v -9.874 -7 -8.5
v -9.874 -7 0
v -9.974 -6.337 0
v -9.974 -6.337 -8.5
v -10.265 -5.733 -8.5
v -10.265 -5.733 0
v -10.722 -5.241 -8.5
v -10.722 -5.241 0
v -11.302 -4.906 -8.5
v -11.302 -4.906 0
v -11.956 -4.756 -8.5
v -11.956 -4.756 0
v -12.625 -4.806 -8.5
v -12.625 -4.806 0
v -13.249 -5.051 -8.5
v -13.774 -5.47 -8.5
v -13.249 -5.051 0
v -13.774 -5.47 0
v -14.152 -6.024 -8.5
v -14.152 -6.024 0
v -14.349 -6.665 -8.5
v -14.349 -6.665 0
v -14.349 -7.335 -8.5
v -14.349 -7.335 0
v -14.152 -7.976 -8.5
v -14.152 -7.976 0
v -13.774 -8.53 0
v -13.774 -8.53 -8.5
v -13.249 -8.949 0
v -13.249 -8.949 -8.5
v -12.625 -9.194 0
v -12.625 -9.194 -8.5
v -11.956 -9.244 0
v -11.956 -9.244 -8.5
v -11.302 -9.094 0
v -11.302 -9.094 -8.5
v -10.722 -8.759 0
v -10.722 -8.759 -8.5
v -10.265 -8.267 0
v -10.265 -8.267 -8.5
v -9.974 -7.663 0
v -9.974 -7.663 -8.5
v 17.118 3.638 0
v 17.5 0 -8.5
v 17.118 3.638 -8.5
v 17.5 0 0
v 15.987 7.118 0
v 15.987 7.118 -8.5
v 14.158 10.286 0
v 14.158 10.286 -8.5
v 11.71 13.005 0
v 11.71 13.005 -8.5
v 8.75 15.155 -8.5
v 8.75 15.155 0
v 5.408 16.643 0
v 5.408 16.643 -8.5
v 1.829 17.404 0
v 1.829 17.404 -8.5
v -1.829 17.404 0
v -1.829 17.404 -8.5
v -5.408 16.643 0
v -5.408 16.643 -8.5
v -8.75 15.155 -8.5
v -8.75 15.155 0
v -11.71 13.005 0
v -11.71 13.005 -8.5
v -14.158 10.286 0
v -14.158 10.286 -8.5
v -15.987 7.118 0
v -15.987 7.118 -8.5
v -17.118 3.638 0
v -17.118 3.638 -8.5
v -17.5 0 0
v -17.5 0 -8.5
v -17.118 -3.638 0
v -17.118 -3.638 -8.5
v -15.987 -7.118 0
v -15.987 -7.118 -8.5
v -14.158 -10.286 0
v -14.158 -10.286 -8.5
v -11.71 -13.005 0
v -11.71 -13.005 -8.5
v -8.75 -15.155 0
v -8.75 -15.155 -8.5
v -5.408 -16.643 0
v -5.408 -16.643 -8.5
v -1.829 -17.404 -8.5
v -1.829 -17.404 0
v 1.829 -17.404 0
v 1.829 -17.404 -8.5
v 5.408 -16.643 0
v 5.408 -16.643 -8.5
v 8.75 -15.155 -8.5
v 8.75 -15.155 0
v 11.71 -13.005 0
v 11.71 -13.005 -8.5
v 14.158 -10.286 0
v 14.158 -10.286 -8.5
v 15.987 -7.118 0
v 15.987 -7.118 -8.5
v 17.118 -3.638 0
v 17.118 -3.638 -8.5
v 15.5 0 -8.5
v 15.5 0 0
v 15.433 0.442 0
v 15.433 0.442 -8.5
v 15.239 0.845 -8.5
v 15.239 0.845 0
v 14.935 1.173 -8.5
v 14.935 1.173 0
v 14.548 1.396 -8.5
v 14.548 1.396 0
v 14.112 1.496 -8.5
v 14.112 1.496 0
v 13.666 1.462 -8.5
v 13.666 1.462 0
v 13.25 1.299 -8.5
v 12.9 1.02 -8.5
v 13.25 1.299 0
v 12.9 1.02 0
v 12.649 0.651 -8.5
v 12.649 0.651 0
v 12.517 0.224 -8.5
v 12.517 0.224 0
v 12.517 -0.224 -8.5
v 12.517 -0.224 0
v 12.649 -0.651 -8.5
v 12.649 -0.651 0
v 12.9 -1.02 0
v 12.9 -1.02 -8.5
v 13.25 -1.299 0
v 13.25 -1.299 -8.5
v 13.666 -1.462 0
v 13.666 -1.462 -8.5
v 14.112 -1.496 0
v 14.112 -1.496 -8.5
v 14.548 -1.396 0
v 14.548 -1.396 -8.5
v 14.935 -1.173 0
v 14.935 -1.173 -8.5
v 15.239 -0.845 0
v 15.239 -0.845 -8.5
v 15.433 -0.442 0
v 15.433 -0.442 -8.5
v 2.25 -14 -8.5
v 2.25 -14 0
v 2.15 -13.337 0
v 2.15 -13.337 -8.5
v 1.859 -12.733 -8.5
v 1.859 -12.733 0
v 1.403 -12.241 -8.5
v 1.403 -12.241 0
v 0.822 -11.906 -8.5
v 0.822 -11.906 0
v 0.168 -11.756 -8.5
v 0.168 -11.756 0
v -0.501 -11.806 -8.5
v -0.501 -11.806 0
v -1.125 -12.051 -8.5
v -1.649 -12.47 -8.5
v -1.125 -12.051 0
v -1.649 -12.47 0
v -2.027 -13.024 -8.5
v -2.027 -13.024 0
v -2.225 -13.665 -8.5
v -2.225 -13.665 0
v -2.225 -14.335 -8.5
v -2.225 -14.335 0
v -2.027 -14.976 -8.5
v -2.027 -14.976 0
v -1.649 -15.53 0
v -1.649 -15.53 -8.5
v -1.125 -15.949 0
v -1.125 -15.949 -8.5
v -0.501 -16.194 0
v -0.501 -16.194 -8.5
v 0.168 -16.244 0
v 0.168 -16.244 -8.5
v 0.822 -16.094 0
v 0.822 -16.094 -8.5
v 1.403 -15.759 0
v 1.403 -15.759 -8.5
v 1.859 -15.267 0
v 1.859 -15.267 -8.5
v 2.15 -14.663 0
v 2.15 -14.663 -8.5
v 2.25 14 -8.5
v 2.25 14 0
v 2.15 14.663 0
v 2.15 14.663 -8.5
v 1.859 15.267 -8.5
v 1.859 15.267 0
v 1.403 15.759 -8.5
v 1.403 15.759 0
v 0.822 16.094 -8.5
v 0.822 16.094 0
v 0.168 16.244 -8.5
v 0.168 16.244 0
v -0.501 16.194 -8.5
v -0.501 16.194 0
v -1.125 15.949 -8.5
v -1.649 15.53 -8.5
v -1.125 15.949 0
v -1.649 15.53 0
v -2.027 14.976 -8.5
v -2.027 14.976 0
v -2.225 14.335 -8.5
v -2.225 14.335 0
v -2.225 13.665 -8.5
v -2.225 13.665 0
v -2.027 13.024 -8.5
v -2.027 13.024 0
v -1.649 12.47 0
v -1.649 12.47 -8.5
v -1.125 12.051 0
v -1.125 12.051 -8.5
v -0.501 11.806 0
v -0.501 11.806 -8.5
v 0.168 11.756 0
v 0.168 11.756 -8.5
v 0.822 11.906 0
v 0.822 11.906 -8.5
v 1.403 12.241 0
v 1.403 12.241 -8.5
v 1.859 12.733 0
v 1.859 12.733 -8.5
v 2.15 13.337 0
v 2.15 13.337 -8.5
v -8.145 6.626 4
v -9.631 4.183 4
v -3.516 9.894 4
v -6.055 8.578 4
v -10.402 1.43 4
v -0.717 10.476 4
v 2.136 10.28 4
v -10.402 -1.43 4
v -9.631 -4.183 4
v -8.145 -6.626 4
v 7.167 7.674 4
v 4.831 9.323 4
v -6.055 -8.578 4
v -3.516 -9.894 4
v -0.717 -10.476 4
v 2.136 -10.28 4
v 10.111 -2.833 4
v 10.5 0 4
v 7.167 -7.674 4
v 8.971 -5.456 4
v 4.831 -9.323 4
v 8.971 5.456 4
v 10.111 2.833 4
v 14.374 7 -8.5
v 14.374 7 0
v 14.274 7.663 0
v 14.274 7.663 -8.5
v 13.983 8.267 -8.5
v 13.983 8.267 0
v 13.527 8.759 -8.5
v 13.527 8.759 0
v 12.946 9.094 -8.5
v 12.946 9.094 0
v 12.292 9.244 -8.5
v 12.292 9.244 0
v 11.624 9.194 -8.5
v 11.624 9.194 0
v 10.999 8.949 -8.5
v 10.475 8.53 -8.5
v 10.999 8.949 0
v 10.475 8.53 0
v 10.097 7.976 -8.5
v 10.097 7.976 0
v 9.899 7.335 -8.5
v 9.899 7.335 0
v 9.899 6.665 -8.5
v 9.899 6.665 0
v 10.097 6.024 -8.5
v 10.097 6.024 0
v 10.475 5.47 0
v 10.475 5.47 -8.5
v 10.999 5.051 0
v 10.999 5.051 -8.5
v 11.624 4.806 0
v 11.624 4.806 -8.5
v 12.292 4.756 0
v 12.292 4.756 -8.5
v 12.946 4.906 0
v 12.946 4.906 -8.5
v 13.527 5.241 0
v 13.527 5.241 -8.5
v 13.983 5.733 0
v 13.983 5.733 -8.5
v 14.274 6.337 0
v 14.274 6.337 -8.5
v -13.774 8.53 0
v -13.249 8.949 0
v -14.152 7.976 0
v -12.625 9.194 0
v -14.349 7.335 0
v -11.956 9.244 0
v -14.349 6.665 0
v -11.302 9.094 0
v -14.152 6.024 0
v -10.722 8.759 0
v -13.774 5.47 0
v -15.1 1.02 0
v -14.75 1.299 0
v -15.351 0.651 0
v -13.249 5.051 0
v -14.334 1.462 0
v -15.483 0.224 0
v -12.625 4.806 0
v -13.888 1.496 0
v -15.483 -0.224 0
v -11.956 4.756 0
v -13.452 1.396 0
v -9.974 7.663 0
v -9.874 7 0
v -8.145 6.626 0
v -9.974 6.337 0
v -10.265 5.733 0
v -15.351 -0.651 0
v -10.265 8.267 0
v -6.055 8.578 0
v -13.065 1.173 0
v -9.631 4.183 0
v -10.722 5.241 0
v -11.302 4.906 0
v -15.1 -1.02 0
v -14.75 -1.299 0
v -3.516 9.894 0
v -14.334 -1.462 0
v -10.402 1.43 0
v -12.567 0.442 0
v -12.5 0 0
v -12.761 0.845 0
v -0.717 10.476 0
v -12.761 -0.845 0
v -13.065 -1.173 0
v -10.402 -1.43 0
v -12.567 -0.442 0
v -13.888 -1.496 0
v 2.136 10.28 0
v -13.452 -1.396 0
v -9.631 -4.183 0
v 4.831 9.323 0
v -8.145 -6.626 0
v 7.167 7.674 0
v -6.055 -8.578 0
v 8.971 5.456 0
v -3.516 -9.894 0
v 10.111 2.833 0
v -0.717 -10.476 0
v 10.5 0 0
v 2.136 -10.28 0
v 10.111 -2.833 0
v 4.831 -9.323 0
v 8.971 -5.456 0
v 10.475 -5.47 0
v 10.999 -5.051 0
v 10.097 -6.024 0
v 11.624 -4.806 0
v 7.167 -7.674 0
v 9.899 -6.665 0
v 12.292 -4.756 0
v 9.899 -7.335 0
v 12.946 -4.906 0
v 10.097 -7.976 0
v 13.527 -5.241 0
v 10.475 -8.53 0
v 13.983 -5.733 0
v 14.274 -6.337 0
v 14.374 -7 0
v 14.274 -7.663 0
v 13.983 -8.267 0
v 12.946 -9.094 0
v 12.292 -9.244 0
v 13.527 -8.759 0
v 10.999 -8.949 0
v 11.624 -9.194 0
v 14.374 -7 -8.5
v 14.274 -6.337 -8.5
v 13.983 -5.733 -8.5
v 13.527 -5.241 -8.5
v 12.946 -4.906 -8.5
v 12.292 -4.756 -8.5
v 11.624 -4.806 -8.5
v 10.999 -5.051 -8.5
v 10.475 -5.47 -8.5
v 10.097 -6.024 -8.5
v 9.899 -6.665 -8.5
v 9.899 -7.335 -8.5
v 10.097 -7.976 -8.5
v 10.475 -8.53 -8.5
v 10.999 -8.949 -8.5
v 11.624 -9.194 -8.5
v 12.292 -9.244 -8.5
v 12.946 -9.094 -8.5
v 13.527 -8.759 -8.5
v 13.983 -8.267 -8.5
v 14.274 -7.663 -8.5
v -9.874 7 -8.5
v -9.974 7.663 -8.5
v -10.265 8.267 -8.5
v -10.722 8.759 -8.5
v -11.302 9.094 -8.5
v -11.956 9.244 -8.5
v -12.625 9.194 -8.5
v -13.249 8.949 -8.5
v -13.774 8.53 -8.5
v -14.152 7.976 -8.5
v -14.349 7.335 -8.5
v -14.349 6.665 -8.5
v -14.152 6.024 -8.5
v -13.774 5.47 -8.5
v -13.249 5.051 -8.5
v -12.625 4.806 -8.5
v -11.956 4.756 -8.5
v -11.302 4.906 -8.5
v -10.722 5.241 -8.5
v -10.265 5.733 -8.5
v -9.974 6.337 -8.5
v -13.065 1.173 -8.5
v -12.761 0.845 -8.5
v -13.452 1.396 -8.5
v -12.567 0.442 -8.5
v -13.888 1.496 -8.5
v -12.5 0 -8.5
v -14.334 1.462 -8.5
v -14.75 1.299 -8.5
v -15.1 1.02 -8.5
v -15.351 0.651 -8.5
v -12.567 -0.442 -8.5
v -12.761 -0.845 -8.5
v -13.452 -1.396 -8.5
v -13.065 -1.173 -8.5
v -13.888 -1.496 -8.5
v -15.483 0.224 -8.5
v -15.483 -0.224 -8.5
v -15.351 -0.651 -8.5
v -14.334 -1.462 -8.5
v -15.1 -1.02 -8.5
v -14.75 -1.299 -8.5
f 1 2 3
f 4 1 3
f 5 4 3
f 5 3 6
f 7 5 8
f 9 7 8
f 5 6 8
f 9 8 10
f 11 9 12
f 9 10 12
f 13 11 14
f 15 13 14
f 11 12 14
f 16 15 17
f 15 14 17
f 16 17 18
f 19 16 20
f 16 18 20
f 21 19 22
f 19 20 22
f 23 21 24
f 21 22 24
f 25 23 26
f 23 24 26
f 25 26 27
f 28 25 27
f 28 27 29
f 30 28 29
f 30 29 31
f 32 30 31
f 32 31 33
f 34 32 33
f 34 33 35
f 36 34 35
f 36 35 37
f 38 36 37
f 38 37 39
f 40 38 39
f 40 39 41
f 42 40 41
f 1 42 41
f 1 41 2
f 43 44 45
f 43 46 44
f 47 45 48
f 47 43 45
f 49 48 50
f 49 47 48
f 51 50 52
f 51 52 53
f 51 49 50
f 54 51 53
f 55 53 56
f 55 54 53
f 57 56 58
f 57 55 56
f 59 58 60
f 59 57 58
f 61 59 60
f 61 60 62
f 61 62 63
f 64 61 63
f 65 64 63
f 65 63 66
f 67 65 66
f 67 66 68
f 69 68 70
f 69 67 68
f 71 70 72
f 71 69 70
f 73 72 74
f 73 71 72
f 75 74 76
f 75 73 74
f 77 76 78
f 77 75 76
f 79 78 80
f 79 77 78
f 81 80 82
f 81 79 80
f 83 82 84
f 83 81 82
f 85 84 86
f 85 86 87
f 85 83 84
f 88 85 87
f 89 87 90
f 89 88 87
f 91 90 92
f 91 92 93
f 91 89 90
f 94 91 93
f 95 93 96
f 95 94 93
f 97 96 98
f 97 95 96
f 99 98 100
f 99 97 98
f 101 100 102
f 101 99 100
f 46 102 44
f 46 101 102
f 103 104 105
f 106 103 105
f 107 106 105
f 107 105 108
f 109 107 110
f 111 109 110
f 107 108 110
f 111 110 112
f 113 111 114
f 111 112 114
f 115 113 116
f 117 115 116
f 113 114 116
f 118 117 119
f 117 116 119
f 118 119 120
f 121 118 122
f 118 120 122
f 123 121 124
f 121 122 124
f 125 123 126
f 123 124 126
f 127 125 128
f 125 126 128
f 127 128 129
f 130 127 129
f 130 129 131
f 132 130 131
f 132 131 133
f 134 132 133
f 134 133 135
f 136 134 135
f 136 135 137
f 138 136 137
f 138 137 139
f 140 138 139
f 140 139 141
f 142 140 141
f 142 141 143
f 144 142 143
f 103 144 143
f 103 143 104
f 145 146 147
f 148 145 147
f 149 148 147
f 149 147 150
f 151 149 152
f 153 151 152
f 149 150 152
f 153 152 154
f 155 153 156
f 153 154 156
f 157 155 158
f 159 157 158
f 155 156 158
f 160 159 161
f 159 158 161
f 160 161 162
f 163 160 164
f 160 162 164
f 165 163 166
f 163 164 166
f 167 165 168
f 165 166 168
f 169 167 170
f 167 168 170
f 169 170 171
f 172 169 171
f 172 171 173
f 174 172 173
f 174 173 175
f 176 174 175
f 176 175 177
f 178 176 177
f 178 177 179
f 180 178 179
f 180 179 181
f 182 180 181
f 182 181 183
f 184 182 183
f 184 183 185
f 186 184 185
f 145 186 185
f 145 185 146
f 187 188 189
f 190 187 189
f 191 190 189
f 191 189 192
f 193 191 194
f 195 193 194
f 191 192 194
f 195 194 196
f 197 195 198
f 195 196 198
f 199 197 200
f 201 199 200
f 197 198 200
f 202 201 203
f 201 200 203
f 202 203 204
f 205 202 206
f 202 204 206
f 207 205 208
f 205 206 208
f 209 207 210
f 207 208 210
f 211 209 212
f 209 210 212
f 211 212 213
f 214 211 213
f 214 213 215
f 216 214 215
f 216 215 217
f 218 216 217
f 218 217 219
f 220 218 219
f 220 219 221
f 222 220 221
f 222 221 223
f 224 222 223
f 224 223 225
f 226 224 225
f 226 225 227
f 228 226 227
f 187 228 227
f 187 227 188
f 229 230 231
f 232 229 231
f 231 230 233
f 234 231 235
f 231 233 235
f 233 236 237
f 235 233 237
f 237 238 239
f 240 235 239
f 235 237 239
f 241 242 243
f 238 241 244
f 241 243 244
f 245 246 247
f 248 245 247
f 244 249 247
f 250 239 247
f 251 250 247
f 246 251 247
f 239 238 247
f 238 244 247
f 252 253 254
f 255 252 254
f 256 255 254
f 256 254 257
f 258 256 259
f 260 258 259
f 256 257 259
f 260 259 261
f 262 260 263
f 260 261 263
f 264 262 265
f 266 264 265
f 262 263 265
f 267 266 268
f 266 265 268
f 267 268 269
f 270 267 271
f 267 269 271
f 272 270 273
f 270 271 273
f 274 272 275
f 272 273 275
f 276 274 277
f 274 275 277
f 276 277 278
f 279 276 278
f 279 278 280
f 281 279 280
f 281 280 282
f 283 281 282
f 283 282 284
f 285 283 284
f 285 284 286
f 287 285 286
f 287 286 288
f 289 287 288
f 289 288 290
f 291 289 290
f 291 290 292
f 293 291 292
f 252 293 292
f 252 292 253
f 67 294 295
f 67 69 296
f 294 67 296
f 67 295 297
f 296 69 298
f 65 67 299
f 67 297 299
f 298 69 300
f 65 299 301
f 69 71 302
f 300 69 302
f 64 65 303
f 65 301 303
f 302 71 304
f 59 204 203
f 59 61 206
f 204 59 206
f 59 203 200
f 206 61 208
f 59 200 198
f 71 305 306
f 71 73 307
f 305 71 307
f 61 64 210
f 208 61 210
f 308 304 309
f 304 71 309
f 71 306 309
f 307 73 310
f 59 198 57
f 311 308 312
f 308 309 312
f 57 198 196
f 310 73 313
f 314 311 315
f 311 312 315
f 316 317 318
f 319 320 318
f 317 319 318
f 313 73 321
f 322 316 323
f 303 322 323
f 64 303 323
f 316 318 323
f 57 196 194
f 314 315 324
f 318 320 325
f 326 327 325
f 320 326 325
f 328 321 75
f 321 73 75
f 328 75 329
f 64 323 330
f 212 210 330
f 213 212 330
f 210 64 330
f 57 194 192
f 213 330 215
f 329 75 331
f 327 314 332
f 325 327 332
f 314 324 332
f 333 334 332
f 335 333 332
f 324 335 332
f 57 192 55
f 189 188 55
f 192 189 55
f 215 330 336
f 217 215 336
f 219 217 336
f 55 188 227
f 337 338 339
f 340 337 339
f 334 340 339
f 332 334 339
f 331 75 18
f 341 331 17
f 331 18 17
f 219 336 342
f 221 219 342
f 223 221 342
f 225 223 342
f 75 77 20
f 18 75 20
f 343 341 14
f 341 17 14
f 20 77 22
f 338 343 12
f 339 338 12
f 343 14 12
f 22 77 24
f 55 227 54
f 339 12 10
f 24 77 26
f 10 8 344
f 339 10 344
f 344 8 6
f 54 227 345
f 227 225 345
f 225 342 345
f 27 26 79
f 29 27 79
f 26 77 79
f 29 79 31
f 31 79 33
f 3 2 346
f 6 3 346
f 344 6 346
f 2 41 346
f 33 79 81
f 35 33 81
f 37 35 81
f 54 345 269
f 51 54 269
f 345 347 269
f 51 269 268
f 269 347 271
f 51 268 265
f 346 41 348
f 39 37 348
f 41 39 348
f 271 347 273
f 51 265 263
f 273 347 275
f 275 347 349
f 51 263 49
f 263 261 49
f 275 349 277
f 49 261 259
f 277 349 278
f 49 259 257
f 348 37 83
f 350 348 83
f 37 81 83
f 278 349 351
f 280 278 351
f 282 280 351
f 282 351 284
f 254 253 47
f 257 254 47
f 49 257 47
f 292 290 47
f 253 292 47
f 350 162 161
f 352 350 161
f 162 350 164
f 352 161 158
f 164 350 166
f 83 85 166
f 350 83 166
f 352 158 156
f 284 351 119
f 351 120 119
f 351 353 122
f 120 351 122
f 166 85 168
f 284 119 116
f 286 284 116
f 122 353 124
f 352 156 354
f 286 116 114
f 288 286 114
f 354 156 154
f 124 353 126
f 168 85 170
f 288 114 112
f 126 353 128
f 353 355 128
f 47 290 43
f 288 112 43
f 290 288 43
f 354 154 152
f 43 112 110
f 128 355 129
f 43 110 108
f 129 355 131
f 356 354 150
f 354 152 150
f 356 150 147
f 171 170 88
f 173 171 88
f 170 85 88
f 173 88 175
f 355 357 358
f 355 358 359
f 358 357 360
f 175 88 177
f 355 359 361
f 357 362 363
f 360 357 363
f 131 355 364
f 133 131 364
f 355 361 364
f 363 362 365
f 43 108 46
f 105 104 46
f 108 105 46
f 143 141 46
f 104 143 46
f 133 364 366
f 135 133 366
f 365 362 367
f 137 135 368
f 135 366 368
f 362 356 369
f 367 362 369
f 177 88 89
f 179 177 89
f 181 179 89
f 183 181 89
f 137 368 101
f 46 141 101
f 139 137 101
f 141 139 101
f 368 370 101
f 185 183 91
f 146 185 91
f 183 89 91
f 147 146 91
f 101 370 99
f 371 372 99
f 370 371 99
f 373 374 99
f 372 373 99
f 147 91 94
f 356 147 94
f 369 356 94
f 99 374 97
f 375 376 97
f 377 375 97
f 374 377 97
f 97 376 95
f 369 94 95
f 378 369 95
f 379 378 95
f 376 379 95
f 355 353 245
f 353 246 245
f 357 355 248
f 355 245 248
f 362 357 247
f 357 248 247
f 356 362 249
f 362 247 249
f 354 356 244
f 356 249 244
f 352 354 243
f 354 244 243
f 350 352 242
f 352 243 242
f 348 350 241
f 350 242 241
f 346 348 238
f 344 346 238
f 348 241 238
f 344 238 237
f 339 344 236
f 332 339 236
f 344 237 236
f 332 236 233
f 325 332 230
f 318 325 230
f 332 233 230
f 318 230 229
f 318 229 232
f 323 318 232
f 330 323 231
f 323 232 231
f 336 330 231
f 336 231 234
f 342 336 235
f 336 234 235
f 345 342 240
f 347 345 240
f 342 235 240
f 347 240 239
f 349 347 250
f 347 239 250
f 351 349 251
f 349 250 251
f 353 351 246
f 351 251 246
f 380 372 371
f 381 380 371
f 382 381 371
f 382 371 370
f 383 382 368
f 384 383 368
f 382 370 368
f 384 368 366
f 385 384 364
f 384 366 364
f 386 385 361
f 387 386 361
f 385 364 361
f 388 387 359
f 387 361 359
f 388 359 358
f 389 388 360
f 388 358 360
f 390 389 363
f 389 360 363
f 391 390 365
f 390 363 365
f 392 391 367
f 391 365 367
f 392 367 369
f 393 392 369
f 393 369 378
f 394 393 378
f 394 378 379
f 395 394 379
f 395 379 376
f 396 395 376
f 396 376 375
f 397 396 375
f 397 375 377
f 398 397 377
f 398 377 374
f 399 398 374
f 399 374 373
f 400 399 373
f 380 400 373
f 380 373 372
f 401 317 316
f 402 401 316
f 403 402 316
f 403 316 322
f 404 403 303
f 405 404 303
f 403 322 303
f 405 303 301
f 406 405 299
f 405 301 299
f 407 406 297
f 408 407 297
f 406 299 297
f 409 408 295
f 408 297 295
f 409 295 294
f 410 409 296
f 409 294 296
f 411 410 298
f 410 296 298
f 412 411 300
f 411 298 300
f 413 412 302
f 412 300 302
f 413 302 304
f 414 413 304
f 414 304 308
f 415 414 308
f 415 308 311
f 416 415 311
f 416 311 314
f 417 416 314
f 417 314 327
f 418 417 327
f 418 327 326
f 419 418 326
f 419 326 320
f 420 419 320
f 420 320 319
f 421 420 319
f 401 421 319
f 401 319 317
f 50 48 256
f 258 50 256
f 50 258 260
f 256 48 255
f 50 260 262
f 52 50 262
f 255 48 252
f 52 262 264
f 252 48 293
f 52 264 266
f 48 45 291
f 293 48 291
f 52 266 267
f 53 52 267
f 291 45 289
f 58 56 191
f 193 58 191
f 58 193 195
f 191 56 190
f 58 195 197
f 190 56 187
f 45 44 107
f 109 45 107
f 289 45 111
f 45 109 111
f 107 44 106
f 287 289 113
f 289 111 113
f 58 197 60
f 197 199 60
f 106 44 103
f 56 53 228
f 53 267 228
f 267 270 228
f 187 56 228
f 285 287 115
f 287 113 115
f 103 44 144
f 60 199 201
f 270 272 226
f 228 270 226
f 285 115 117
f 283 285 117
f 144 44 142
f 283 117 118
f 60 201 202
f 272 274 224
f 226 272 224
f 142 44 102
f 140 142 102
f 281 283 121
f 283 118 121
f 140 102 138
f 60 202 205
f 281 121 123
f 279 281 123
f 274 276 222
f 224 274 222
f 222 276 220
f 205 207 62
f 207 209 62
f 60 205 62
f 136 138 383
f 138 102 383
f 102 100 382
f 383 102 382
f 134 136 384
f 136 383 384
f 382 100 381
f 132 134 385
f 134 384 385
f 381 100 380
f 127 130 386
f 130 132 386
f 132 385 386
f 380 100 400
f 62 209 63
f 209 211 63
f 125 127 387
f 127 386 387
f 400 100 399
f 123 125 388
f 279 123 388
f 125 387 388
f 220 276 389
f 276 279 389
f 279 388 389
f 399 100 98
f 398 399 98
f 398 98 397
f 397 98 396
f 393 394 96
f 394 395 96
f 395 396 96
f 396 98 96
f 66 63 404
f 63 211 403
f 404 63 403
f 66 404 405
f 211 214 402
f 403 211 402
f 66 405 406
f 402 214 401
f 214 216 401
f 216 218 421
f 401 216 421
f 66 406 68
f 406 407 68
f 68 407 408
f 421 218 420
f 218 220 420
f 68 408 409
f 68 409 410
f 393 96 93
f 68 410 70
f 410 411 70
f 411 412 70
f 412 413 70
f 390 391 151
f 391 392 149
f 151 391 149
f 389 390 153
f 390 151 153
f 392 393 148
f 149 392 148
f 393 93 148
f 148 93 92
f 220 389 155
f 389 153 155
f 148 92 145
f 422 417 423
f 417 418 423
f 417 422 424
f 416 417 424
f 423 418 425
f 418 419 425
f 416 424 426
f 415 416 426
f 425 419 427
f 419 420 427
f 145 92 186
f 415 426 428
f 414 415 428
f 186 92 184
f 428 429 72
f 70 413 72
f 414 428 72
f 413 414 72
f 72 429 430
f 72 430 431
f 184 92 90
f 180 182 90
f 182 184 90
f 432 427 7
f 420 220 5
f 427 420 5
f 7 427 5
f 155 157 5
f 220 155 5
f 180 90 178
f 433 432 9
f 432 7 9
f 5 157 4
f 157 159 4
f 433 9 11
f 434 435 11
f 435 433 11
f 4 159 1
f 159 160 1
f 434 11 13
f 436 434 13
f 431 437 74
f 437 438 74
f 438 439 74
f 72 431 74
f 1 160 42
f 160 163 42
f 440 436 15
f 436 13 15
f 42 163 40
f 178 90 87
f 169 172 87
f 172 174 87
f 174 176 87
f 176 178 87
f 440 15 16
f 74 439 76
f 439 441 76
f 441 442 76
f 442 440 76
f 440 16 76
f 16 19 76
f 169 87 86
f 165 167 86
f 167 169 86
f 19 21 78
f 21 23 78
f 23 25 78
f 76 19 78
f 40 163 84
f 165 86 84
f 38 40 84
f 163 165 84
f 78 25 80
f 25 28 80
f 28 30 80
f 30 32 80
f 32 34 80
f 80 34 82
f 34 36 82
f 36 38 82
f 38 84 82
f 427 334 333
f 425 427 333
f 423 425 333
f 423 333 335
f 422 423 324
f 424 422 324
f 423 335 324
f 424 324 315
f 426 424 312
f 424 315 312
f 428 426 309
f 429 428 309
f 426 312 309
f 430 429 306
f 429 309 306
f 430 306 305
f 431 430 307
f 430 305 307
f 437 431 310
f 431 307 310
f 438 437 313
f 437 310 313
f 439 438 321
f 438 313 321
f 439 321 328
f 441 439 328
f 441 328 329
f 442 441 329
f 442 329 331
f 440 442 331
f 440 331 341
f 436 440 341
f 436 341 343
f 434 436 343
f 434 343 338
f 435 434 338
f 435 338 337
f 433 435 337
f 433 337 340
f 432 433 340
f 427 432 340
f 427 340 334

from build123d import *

# Parameters (mm, degrees)
M4_CLEARANCE_HOLE1_D  = 4.5
F_3_0MM_DOWEL_HOLE1_D = 3
SKETCH9_R             = 19
SKETCH9_R_2           = 17.5
CUT_EXTRUDE1_DEPTH    = 29.182441342


with BuildPart() as part:
    # Sketch1 → Revolve1 (revolve)
    with BuildSketch(Plane(origin=(0, 0, 0), x_dir=(1, 0, 0), z_dir=(0, 1, 0))):
        Polygon((19, 8.5), (19, 7.5), (17.5, 7.5), (17.5, 1), (19, 1), (19, 0), (10.5, 0), (10.5, -4), (0, -4), (0, 8.5), align=None)
    revolve(axis=Axis((0, 0, 4), (0, 0, -1)))

    # M4 Clearance Hole1 (through all)
    with Locations(Plane(origin=(0, 0, -8.5), x_dir=(-1, 0, 0), z_dir=(0, 0, -1))):
        with Locations((-12.124355653, 7), (0, 14), (12.124355653, 7), (12.124355653, -7), (0, -14), (-12.124355653, -7)):
            Hole(M4_CLEARANCE_HOLE1_D / 2)

    # Ø3.0mm Dowel Hole1 (through all)
    with Locations(Plane(origin=(0, 0, -8.5), x_dir=(-1, 0, 0), z_dir=(0, 0, -1))):
        with Locations((14, 0), (-14, 0)):
            Hole(F_3_0MM_DOWEL_HOLE1_D / 2)

    # Sketch9 → Cut-Extrude1 (cut, through all)
    with BuildSketch(Plane.XY):
        Circle(SKETCH9_R)
        Circle(SKETCH9_R_2, mode=Mode.SUBTRACT)
    extrude(amount=-CUT_EXTRUDE1_DEPTH, mode=Mode.SUBTRACT)


solid = part.part
